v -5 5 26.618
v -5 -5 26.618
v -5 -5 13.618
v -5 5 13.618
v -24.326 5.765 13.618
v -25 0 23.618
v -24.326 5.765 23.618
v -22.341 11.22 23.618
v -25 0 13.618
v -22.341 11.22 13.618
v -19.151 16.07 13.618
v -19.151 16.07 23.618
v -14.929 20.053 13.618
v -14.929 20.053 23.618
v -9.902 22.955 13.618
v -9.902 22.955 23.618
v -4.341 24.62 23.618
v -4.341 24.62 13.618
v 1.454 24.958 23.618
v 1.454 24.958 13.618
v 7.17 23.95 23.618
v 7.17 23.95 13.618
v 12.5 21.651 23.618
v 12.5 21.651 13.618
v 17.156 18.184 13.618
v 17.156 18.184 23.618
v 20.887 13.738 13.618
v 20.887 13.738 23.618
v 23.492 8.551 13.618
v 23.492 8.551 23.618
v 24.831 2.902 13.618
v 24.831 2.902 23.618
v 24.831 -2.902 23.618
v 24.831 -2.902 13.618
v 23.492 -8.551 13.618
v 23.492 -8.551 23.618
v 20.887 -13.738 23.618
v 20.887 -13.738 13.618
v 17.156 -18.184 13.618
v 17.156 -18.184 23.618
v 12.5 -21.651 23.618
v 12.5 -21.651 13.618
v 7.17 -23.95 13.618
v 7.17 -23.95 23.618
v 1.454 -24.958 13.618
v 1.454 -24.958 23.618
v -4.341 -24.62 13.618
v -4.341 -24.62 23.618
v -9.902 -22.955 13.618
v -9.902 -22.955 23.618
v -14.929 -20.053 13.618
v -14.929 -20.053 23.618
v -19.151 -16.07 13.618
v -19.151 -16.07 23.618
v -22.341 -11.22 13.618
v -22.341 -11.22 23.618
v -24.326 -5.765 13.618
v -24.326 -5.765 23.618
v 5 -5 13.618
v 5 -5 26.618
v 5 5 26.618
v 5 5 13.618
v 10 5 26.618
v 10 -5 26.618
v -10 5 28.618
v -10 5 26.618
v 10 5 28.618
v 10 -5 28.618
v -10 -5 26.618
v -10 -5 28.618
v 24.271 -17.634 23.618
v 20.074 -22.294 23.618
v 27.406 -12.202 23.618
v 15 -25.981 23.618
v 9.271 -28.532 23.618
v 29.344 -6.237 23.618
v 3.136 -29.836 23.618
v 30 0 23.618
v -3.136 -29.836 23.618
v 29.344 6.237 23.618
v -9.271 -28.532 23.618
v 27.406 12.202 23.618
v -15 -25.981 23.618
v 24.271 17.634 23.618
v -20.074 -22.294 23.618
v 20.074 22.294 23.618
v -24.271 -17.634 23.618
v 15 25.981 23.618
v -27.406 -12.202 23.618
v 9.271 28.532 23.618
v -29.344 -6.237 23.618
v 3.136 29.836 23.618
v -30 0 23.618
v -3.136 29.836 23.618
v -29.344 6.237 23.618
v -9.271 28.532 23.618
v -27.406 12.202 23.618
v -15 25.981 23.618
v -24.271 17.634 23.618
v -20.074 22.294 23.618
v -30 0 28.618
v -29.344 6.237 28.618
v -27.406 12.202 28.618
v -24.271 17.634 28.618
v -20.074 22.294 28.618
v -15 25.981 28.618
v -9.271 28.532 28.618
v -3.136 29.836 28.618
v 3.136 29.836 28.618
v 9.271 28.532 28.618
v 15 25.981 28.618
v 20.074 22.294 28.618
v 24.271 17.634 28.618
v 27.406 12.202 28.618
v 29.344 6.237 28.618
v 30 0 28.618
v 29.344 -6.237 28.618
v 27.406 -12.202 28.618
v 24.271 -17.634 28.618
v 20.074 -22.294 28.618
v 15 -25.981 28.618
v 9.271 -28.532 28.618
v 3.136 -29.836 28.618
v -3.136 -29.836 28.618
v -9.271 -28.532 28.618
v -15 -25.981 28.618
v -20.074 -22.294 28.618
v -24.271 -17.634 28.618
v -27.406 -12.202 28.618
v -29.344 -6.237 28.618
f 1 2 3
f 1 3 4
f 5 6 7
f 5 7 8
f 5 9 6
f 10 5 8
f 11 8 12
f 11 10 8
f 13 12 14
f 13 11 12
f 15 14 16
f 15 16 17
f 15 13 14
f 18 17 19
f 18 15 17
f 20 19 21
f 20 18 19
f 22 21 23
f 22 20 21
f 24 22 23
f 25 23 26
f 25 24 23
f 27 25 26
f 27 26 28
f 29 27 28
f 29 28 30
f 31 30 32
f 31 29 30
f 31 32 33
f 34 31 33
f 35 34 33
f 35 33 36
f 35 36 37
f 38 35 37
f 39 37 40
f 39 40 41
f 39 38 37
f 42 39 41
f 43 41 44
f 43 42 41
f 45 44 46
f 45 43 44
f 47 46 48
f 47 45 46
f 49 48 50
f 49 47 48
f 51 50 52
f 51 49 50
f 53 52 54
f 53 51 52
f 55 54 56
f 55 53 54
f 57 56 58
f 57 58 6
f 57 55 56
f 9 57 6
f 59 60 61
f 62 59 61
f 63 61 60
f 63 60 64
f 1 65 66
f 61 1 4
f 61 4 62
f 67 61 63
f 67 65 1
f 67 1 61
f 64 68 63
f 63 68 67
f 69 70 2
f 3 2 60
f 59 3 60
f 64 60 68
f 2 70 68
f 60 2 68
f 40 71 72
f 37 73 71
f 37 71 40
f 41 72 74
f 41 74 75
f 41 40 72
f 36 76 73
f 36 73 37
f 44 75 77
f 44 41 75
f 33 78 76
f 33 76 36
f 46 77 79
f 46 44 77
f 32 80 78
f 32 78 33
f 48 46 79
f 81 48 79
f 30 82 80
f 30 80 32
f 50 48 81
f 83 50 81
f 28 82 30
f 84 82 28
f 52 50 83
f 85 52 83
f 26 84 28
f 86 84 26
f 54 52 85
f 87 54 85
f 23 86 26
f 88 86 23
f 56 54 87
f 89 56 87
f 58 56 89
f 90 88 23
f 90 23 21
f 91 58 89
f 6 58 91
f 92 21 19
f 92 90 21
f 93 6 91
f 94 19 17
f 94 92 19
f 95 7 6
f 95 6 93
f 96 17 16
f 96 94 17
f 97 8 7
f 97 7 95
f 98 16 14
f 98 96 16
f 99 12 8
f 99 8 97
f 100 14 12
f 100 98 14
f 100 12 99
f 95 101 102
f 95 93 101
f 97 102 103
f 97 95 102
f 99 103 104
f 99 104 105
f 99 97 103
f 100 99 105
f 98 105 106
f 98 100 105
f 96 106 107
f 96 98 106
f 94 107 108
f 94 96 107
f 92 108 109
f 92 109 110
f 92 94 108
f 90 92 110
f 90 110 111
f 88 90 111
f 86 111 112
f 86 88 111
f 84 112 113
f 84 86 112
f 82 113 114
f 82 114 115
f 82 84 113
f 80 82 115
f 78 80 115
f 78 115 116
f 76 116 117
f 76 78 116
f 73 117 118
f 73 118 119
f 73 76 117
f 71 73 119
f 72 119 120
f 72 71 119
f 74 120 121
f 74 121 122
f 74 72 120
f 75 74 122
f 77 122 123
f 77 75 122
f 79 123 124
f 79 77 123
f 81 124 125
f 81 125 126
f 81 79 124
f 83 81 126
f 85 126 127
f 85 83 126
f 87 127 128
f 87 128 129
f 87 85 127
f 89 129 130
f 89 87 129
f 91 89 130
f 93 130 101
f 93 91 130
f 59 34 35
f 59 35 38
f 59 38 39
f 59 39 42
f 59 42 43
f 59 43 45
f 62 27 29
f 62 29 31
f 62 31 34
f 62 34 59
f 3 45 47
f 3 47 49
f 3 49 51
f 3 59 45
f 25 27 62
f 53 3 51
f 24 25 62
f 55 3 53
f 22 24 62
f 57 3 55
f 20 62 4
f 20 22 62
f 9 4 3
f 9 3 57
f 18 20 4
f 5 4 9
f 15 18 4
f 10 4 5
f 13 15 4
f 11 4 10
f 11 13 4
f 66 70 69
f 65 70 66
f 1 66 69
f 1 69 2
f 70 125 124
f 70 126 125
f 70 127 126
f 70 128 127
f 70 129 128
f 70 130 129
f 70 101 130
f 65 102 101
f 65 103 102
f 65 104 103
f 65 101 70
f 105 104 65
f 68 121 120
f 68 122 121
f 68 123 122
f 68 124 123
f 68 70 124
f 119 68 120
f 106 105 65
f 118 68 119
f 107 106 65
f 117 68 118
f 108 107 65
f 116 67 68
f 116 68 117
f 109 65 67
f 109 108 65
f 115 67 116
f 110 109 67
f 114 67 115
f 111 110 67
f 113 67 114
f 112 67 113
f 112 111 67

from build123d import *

# Parameters (mm, degrees)
F2_W     = 20
F2_H     = 10
F3_DEPTH = 2
F4_W     = 10
F4_H     = 10
F5_DEPTH = 25


with BuildPart() as f1:
    # F0 (on Front) → F1 (revolve)
    with BuildSketch(Plane.XZ):
        Polygon((0, 13.617994), (0, 28.617994), (-30, 28.617994), (-30, 23.617994), (-25, 23.617994), (-25, 13.617994), align=None)
    revolve(axis=Axis((0, 0, -2.582015), (0, 0, -1)))

    # F2 (on face) → F3 (cut)
    with BuildSketch(Plane.XY.offset(28.617994)):
        Rectangle(F2_W, F2_H)
    extrude(amount=-F3_DEPTH, mode=Mode.SUBTRACT)

    # F4 (on face) → F5 (cut)
    with BuildSketch(Plane.XY.offset(26.617994)):
        Rectangle(F4_W, F4_H)
    extrude(amount=-F5_DEPTH, mode=Mode.SUBTRACT)


solid = f1.part
